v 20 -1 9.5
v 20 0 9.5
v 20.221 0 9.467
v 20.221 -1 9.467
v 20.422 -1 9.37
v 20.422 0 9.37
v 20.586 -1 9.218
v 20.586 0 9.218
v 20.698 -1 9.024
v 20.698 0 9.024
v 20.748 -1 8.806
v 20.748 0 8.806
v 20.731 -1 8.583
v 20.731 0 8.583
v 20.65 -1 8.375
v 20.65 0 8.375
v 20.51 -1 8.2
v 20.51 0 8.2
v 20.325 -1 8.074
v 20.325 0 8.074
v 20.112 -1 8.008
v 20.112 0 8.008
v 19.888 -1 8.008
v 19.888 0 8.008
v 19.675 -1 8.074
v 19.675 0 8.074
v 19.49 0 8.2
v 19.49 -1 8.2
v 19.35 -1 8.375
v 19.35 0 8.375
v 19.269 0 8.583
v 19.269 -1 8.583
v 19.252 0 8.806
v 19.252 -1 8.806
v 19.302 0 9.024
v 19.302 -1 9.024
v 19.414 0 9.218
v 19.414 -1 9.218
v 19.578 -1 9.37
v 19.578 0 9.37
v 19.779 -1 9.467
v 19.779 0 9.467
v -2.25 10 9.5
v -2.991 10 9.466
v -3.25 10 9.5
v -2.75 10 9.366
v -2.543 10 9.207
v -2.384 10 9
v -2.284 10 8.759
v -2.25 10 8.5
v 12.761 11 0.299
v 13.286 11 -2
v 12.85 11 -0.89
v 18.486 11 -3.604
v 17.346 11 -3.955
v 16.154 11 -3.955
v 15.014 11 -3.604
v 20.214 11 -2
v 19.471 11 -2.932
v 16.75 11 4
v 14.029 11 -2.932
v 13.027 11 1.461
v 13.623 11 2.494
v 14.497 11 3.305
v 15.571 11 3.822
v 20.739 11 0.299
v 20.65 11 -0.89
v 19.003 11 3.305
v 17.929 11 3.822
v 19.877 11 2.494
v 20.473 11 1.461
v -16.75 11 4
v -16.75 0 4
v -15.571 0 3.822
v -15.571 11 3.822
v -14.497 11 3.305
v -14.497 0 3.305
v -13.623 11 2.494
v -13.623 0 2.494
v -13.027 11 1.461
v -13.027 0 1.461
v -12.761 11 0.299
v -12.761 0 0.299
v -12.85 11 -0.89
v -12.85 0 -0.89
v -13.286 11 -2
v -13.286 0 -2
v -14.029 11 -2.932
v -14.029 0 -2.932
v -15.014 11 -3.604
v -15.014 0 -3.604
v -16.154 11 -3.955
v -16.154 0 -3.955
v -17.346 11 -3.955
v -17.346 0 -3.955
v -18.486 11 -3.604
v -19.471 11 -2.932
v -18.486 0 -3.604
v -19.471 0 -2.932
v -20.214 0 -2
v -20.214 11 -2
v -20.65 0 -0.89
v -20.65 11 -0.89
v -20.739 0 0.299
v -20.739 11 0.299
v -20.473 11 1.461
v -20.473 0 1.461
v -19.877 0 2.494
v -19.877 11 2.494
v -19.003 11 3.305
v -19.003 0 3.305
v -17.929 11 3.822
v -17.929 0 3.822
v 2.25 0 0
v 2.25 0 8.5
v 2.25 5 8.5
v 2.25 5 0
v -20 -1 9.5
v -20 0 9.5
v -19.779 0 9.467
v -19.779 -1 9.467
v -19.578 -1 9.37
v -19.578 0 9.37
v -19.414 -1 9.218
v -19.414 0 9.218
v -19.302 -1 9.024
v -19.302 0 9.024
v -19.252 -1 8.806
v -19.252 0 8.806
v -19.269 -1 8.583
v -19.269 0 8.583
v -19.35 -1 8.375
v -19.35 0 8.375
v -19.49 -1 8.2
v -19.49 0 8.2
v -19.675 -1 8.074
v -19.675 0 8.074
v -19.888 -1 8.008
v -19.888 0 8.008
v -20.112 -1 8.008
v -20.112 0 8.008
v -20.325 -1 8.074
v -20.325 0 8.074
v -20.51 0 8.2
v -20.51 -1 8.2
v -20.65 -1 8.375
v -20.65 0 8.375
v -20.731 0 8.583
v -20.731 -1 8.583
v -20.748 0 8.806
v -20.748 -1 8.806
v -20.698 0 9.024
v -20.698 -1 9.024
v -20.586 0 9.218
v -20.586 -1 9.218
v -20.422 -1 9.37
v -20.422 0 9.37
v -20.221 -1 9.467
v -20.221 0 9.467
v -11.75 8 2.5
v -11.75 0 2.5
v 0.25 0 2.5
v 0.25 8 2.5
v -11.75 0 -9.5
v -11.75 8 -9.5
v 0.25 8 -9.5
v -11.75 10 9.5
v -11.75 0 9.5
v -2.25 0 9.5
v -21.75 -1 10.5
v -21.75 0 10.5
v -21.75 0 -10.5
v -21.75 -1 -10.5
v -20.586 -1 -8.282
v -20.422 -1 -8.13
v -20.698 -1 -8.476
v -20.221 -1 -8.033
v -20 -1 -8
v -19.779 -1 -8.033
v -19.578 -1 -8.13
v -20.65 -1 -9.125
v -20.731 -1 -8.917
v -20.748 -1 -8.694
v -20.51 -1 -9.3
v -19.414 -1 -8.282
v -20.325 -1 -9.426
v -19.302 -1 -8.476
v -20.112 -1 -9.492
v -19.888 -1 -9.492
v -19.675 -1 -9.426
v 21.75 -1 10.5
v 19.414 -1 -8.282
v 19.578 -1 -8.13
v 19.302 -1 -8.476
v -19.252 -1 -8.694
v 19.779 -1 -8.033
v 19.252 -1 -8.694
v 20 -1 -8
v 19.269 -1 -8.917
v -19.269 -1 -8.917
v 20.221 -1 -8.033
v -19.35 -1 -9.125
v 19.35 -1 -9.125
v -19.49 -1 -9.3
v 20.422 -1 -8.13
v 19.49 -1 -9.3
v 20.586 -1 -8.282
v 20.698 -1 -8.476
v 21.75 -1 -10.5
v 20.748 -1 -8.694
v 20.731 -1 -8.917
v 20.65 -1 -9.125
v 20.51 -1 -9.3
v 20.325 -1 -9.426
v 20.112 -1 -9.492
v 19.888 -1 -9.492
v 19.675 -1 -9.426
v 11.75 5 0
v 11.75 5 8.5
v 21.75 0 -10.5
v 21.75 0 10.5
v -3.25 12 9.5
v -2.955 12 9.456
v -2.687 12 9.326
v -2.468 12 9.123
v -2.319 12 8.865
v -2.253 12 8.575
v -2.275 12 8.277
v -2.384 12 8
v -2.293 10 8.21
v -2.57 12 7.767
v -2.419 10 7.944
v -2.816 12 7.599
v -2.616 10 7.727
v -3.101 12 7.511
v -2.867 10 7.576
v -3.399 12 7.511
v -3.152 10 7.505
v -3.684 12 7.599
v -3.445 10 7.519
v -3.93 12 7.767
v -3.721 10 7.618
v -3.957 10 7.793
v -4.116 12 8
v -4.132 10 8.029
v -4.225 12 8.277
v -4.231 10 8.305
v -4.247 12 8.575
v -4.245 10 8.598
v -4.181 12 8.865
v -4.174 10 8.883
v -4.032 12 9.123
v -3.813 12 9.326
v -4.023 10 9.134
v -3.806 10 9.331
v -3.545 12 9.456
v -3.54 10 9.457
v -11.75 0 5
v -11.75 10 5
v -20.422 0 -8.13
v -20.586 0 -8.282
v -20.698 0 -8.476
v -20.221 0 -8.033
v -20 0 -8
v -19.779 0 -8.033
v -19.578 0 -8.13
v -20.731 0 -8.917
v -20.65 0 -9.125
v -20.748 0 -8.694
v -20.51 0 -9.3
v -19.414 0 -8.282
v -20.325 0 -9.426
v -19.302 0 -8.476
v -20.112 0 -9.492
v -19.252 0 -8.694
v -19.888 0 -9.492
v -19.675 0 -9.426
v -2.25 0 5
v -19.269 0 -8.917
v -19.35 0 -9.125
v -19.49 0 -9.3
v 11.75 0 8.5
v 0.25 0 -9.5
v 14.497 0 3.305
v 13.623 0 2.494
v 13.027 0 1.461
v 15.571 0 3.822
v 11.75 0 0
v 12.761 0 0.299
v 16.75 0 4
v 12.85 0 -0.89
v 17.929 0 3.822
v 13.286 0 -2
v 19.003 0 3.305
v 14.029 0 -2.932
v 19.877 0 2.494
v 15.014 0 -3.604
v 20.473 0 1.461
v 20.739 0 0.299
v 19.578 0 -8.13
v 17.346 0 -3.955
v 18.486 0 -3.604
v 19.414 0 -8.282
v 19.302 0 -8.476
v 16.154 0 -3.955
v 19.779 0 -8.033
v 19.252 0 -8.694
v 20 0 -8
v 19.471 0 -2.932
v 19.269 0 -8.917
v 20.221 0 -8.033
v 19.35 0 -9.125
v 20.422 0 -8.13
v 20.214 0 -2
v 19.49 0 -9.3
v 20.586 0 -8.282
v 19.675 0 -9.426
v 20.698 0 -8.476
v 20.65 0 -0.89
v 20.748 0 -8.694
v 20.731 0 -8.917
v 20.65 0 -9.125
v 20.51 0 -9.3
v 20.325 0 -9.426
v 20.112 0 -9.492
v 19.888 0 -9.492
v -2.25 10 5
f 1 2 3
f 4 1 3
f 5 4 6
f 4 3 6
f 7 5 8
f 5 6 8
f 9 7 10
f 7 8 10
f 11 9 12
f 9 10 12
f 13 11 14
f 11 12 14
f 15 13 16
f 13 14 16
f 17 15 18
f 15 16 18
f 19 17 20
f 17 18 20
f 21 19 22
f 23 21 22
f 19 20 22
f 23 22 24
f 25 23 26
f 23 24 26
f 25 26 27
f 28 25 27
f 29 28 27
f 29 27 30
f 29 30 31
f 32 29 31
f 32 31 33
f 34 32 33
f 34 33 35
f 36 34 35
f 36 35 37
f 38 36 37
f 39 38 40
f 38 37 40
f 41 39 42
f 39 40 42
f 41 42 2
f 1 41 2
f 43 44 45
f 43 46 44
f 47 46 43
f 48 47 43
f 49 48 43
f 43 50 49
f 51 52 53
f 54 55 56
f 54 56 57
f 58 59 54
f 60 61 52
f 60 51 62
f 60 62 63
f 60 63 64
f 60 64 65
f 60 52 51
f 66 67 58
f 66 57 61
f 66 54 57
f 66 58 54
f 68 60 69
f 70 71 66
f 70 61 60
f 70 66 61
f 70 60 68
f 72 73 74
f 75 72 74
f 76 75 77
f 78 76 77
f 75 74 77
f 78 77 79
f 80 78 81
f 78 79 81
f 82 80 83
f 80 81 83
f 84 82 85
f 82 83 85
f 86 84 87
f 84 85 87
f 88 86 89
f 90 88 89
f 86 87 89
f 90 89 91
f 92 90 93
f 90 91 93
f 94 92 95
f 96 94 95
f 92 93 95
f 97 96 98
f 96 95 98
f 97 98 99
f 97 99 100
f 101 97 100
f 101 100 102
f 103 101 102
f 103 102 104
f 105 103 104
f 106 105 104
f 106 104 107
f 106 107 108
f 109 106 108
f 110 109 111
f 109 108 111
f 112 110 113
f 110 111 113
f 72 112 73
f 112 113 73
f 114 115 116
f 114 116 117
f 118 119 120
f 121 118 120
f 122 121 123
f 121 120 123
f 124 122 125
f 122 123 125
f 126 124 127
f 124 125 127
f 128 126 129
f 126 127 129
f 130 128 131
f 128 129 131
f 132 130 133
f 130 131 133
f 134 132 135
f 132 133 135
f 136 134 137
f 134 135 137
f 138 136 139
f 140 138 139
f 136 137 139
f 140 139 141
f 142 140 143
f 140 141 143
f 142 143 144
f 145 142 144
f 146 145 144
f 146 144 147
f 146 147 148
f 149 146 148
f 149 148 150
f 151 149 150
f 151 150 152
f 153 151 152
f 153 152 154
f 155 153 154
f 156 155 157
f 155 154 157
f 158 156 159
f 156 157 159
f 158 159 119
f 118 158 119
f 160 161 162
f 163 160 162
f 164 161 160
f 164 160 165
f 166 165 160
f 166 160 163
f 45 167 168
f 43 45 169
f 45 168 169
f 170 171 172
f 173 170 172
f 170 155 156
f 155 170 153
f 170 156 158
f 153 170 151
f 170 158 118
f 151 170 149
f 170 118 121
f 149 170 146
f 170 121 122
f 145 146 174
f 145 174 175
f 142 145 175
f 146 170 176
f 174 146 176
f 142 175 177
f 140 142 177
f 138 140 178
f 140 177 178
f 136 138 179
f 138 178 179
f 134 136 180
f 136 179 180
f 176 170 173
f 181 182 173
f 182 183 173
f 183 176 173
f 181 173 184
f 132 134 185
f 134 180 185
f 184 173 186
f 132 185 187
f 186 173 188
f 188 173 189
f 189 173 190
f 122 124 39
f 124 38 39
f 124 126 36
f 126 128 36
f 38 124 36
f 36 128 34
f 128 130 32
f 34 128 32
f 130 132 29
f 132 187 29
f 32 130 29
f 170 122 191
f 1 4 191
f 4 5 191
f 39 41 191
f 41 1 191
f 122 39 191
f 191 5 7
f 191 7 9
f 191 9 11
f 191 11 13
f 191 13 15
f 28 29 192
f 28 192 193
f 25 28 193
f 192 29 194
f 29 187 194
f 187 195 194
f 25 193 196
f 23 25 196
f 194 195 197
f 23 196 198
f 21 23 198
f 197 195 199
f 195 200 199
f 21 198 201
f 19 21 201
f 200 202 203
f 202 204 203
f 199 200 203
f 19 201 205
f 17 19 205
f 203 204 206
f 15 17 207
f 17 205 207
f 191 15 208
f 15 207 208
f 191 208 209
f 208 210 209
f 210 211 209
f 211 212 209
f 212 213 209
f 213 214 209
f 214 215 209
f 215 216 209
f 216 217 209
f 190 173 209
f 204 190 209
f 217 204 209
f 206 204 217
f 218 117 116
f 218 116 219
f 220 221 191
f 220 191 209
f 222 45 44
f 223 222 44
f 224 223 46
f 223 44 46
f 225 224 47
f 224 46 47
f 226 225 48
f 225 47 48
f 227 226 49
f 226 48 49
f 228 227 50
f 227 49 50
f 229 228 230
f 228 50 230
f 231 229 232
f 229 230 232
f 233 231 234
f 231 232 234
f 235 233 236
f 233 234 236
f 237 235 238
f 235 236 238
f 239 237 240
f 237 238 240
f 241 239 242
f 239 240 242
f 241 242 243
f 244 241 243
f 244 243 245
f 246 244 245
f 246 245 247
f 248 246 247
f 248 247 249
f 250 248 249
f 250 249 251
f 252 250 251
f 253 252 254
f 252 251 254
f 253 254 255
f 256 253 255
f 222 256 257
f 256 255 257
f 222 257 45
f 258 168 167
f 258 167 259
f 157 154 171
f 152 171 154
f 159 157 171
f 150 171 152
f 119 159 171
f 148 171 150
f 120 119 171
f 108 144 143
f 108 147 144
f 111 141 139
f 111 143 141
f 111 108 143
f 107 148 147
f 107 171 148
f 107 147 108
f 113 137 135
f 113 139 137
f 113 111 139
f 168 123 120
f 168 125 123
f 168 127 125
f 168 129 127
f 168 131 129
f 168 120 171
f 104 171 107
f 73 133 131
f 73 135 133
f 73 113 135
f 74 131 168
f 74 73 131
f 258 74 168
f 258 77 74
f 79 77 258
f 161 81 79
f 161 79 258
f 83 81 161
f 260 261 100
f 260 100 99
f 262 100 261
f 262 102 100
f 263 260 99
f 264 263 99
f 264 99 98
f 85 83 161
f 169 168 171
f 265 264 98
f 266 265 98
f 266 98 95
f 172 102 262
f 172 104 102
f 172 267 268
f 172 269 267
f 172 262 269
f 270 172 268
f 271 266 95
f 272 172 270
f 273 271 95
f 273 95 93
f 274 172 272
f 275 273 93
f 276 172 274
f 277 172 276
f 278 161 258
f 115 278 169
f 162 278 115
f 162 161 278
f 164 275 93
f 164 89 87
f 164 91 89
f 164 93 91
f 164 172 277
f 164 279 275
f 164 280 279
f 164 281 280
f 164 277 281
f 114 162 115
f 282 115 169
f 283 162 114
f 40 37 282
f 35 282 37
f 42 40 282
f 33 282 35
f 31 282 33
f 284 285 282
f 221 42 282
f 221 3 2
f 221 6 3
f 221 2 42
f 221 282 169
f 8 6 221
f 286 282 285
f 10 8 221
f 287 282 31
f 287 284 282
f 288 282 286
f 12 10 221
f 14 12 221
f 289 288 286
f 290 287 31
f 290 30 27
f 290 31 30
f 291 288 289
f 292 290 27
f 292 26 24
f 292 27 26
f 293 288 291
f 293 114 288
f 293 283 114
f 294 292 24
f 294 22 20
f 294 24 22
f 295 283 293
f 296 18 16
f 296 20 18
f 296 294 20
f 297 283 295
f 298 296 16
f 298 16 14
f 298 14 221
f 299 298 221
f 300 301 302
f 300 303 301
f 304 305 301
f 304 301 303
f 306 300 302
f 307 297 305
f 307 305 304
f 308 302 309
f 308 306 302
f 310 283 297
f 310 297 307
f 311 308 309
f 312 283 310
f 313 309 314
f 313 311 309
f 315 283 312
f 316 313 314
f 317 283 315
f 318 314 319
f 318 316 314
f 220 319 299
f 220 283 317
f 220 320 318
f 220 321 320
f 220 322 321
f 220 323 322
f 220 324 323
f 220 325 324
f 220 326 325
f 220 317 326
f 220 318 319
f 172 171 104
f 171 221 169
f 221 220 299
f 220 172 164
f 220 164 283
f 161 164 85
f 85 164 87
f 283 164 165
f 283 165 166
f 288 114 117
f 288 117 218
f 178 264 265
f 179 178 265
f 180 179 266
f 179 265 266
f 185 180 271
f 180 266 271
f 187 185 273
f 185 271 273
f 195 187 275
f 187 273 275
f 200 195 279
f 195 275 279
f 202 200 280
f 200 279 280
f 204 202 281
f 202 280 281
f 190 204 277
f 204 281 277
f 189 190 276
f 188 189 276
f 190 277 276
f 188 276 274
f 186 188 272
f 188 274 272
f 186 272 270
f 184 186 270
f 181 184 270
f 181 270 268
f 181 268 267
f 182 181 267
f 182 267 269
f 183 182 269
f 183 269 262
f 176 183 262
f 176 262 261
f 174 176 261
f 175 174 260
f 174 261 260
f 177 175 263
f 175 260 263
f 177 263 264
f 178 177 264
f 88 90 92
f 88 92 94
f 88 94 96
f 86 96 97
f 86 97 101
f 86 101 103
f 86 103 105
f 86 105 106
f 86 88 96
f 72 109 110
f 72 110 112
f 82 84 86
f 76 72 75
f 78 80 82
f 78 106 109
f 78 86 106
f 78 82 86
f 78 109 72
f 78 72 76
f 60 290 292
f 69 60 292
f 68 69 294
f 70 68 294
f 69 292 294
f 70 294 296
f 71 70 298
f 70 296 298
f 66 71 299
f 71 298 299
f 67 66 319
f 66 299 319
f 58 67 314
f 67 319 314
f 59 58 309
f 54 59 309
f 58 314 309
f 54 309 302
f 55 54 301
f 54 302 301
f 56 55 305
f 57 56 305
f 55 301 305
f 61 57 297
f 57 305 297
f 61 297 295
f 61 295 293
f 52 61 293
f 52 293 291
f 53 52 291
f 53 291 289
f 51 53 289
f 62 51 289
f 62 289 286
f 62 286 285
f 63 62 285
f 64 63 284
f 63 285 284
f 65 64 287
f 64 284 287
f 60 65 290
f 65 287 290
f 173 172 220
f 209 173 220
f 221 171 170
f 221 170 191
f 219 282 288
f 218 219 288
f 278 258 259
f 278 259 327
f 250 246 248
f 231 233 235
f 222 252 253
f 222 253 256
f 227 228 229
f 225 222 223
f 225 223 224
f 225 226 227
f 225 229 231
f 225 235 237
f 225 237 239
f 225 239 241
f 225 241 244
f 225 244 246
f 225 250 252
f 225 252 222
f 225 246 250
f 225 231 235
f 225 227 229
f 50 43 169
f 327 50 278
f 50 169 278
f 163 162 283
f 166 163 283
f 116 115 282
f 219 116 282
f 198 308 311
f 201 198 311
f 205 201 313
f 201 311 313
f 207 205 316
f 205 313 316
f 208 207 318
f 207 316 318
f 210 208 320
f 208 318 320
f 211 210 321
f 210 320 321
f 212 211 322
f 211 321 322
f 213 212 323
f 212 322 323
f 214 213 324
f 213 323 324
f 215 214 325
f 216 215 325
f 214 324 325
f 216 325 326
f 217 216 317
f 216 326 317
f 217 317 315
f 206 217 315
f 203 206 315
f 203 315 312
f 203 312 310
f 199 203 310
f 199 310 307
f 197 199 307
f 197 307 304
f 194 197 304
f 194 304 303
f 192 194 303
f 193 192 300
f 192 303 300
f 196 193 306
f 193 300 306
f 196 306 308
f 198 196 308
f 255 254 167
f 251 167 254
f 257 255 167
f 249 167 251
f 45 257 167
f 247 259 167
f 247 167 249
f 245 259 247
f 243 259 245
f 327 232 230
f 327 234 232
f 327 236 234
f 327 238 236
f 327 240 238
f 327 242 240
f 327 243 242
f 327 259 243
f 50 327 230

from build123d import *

# Parameters (mm, degrees)
SKETCH_1_W      = 43.5
SKETCH_1_H      = 21
SKETCH_1_R      = 0.75
EXTRUDE_1_DEPTH = 1
SKETCH_1_3_R    = 4
EXTRUDE_2_DEPTH = 11
SKETCH_1_4_W    = 9.5
SKETCH_1_4_H    = 8.5
EXTRUDE_3_DEPTH = 5
SKETCH_1_5_W    = 9.5
SKETCH_1_5_H    = 4.5
EXTRUDE_4_DEPTH = 10
SKETCH_1_6_W    = 12
SKETCH_1_6_H    = 12
EXTRUDE_5_DEPTH = 8
SKETCH_2_R      = 1
EXTRUDE_6_DEPTH = 2


with BuildPart() as part:
    # Эскиз1 → Бобышка-Вытянуть1 (new body)
    with BuildSketch(Plane(origin=(0, 0, 0), x_dir=(1, 0, 0), z_dir=(0, 1, 0))):
        Rectangle(SKETCH_1_W, SKETCH_1_H)
        with Locations((-20, -8.75)):
            Circle(SKETCH_1_R, mode=Mode.SUBTRACT)
        with Locations((20, -8.75)):
            Circle(SKETCH_1_R, mode=Mode.SUBTRACT)
        with Locations((-20, 8.75)):
            Circle(SKETCH_1_R, mode=Mode.SUBTRACT)
        with Locations((20, 8.75)):
            Circle(SKETCH_1_R, mode=Mode.SUBTRACT)
    extrude(amount=-EXTRUDE_1_DEPTH)

    # Эскиз1<3> → Бобышка-Вытянуть2 (add)
    with BuildSketch(Plane(origin=(0, 0, 0), x_dir=(1, 0, 0), z_dir=(0, 1, 0))):
        with Locations((-16.75, 0)):
            Circle(SKETCH_1_3_R)
        with Locations((16.75, 0)):
            Circle(SKETCH_1_3_R)
    extrude(amount=EXTRUDE_2_DEPTH)

    # Эскиз1<4> → Бобышка-Вытянуть3 (add)
    with BuildSketch(Plane(origin=(0, 0, 0), x_dir=(1, 0, 0), z_dir=(0, 1, 0))):
        with Locations((7, -4.25)):
            Rectangle(SKETCH_1_4_W, SKETCH_1_4_H)
    extrude(amount=EXTRUDE_3_DEPTH)

    # Эскиз1<5> → Бобышка-Вытянуть4 (add)
    with BuildSketch(Plane(origin=(0, 0, 0), x_dir=(1, 0, 0), z_dir=(0, 1, 0))):
        with Locations((-7, -7.25)):
            Rectangle(SKETCH_1_5_W, SKETCH_1_5_H)
    extrude(amount=EXTRUDE_4_DEPTH)

    # Эскиз1<6> → Бобышка-Вытянуть5 (add)
    with BuildSketch(Plane(origin=(0, 0, 0), x_dir=(1, 0, 0), z_dir=(0, 1, 0))):
        with Locations((-5.75, 3.5)):
            Rectangle(SKETCH_1_6_W, SKETCH_1_6_H)
    extrude(amount=EXTRUDE_5_DEPTH)

    # Эскиз2 → Бобышка-Вытянуть6 (add)
    with BuildSketch(Plane(origin=(0, 10, 0), x_dir=(1, 0, 0), z_dir=(0, 1, 0))):
        with Locations((-3.25, -8.5)):
            Circle(SKETCH_2_R)
    extrude(amount=EXTRUDE_6_DEPTH)


solid = part.part
